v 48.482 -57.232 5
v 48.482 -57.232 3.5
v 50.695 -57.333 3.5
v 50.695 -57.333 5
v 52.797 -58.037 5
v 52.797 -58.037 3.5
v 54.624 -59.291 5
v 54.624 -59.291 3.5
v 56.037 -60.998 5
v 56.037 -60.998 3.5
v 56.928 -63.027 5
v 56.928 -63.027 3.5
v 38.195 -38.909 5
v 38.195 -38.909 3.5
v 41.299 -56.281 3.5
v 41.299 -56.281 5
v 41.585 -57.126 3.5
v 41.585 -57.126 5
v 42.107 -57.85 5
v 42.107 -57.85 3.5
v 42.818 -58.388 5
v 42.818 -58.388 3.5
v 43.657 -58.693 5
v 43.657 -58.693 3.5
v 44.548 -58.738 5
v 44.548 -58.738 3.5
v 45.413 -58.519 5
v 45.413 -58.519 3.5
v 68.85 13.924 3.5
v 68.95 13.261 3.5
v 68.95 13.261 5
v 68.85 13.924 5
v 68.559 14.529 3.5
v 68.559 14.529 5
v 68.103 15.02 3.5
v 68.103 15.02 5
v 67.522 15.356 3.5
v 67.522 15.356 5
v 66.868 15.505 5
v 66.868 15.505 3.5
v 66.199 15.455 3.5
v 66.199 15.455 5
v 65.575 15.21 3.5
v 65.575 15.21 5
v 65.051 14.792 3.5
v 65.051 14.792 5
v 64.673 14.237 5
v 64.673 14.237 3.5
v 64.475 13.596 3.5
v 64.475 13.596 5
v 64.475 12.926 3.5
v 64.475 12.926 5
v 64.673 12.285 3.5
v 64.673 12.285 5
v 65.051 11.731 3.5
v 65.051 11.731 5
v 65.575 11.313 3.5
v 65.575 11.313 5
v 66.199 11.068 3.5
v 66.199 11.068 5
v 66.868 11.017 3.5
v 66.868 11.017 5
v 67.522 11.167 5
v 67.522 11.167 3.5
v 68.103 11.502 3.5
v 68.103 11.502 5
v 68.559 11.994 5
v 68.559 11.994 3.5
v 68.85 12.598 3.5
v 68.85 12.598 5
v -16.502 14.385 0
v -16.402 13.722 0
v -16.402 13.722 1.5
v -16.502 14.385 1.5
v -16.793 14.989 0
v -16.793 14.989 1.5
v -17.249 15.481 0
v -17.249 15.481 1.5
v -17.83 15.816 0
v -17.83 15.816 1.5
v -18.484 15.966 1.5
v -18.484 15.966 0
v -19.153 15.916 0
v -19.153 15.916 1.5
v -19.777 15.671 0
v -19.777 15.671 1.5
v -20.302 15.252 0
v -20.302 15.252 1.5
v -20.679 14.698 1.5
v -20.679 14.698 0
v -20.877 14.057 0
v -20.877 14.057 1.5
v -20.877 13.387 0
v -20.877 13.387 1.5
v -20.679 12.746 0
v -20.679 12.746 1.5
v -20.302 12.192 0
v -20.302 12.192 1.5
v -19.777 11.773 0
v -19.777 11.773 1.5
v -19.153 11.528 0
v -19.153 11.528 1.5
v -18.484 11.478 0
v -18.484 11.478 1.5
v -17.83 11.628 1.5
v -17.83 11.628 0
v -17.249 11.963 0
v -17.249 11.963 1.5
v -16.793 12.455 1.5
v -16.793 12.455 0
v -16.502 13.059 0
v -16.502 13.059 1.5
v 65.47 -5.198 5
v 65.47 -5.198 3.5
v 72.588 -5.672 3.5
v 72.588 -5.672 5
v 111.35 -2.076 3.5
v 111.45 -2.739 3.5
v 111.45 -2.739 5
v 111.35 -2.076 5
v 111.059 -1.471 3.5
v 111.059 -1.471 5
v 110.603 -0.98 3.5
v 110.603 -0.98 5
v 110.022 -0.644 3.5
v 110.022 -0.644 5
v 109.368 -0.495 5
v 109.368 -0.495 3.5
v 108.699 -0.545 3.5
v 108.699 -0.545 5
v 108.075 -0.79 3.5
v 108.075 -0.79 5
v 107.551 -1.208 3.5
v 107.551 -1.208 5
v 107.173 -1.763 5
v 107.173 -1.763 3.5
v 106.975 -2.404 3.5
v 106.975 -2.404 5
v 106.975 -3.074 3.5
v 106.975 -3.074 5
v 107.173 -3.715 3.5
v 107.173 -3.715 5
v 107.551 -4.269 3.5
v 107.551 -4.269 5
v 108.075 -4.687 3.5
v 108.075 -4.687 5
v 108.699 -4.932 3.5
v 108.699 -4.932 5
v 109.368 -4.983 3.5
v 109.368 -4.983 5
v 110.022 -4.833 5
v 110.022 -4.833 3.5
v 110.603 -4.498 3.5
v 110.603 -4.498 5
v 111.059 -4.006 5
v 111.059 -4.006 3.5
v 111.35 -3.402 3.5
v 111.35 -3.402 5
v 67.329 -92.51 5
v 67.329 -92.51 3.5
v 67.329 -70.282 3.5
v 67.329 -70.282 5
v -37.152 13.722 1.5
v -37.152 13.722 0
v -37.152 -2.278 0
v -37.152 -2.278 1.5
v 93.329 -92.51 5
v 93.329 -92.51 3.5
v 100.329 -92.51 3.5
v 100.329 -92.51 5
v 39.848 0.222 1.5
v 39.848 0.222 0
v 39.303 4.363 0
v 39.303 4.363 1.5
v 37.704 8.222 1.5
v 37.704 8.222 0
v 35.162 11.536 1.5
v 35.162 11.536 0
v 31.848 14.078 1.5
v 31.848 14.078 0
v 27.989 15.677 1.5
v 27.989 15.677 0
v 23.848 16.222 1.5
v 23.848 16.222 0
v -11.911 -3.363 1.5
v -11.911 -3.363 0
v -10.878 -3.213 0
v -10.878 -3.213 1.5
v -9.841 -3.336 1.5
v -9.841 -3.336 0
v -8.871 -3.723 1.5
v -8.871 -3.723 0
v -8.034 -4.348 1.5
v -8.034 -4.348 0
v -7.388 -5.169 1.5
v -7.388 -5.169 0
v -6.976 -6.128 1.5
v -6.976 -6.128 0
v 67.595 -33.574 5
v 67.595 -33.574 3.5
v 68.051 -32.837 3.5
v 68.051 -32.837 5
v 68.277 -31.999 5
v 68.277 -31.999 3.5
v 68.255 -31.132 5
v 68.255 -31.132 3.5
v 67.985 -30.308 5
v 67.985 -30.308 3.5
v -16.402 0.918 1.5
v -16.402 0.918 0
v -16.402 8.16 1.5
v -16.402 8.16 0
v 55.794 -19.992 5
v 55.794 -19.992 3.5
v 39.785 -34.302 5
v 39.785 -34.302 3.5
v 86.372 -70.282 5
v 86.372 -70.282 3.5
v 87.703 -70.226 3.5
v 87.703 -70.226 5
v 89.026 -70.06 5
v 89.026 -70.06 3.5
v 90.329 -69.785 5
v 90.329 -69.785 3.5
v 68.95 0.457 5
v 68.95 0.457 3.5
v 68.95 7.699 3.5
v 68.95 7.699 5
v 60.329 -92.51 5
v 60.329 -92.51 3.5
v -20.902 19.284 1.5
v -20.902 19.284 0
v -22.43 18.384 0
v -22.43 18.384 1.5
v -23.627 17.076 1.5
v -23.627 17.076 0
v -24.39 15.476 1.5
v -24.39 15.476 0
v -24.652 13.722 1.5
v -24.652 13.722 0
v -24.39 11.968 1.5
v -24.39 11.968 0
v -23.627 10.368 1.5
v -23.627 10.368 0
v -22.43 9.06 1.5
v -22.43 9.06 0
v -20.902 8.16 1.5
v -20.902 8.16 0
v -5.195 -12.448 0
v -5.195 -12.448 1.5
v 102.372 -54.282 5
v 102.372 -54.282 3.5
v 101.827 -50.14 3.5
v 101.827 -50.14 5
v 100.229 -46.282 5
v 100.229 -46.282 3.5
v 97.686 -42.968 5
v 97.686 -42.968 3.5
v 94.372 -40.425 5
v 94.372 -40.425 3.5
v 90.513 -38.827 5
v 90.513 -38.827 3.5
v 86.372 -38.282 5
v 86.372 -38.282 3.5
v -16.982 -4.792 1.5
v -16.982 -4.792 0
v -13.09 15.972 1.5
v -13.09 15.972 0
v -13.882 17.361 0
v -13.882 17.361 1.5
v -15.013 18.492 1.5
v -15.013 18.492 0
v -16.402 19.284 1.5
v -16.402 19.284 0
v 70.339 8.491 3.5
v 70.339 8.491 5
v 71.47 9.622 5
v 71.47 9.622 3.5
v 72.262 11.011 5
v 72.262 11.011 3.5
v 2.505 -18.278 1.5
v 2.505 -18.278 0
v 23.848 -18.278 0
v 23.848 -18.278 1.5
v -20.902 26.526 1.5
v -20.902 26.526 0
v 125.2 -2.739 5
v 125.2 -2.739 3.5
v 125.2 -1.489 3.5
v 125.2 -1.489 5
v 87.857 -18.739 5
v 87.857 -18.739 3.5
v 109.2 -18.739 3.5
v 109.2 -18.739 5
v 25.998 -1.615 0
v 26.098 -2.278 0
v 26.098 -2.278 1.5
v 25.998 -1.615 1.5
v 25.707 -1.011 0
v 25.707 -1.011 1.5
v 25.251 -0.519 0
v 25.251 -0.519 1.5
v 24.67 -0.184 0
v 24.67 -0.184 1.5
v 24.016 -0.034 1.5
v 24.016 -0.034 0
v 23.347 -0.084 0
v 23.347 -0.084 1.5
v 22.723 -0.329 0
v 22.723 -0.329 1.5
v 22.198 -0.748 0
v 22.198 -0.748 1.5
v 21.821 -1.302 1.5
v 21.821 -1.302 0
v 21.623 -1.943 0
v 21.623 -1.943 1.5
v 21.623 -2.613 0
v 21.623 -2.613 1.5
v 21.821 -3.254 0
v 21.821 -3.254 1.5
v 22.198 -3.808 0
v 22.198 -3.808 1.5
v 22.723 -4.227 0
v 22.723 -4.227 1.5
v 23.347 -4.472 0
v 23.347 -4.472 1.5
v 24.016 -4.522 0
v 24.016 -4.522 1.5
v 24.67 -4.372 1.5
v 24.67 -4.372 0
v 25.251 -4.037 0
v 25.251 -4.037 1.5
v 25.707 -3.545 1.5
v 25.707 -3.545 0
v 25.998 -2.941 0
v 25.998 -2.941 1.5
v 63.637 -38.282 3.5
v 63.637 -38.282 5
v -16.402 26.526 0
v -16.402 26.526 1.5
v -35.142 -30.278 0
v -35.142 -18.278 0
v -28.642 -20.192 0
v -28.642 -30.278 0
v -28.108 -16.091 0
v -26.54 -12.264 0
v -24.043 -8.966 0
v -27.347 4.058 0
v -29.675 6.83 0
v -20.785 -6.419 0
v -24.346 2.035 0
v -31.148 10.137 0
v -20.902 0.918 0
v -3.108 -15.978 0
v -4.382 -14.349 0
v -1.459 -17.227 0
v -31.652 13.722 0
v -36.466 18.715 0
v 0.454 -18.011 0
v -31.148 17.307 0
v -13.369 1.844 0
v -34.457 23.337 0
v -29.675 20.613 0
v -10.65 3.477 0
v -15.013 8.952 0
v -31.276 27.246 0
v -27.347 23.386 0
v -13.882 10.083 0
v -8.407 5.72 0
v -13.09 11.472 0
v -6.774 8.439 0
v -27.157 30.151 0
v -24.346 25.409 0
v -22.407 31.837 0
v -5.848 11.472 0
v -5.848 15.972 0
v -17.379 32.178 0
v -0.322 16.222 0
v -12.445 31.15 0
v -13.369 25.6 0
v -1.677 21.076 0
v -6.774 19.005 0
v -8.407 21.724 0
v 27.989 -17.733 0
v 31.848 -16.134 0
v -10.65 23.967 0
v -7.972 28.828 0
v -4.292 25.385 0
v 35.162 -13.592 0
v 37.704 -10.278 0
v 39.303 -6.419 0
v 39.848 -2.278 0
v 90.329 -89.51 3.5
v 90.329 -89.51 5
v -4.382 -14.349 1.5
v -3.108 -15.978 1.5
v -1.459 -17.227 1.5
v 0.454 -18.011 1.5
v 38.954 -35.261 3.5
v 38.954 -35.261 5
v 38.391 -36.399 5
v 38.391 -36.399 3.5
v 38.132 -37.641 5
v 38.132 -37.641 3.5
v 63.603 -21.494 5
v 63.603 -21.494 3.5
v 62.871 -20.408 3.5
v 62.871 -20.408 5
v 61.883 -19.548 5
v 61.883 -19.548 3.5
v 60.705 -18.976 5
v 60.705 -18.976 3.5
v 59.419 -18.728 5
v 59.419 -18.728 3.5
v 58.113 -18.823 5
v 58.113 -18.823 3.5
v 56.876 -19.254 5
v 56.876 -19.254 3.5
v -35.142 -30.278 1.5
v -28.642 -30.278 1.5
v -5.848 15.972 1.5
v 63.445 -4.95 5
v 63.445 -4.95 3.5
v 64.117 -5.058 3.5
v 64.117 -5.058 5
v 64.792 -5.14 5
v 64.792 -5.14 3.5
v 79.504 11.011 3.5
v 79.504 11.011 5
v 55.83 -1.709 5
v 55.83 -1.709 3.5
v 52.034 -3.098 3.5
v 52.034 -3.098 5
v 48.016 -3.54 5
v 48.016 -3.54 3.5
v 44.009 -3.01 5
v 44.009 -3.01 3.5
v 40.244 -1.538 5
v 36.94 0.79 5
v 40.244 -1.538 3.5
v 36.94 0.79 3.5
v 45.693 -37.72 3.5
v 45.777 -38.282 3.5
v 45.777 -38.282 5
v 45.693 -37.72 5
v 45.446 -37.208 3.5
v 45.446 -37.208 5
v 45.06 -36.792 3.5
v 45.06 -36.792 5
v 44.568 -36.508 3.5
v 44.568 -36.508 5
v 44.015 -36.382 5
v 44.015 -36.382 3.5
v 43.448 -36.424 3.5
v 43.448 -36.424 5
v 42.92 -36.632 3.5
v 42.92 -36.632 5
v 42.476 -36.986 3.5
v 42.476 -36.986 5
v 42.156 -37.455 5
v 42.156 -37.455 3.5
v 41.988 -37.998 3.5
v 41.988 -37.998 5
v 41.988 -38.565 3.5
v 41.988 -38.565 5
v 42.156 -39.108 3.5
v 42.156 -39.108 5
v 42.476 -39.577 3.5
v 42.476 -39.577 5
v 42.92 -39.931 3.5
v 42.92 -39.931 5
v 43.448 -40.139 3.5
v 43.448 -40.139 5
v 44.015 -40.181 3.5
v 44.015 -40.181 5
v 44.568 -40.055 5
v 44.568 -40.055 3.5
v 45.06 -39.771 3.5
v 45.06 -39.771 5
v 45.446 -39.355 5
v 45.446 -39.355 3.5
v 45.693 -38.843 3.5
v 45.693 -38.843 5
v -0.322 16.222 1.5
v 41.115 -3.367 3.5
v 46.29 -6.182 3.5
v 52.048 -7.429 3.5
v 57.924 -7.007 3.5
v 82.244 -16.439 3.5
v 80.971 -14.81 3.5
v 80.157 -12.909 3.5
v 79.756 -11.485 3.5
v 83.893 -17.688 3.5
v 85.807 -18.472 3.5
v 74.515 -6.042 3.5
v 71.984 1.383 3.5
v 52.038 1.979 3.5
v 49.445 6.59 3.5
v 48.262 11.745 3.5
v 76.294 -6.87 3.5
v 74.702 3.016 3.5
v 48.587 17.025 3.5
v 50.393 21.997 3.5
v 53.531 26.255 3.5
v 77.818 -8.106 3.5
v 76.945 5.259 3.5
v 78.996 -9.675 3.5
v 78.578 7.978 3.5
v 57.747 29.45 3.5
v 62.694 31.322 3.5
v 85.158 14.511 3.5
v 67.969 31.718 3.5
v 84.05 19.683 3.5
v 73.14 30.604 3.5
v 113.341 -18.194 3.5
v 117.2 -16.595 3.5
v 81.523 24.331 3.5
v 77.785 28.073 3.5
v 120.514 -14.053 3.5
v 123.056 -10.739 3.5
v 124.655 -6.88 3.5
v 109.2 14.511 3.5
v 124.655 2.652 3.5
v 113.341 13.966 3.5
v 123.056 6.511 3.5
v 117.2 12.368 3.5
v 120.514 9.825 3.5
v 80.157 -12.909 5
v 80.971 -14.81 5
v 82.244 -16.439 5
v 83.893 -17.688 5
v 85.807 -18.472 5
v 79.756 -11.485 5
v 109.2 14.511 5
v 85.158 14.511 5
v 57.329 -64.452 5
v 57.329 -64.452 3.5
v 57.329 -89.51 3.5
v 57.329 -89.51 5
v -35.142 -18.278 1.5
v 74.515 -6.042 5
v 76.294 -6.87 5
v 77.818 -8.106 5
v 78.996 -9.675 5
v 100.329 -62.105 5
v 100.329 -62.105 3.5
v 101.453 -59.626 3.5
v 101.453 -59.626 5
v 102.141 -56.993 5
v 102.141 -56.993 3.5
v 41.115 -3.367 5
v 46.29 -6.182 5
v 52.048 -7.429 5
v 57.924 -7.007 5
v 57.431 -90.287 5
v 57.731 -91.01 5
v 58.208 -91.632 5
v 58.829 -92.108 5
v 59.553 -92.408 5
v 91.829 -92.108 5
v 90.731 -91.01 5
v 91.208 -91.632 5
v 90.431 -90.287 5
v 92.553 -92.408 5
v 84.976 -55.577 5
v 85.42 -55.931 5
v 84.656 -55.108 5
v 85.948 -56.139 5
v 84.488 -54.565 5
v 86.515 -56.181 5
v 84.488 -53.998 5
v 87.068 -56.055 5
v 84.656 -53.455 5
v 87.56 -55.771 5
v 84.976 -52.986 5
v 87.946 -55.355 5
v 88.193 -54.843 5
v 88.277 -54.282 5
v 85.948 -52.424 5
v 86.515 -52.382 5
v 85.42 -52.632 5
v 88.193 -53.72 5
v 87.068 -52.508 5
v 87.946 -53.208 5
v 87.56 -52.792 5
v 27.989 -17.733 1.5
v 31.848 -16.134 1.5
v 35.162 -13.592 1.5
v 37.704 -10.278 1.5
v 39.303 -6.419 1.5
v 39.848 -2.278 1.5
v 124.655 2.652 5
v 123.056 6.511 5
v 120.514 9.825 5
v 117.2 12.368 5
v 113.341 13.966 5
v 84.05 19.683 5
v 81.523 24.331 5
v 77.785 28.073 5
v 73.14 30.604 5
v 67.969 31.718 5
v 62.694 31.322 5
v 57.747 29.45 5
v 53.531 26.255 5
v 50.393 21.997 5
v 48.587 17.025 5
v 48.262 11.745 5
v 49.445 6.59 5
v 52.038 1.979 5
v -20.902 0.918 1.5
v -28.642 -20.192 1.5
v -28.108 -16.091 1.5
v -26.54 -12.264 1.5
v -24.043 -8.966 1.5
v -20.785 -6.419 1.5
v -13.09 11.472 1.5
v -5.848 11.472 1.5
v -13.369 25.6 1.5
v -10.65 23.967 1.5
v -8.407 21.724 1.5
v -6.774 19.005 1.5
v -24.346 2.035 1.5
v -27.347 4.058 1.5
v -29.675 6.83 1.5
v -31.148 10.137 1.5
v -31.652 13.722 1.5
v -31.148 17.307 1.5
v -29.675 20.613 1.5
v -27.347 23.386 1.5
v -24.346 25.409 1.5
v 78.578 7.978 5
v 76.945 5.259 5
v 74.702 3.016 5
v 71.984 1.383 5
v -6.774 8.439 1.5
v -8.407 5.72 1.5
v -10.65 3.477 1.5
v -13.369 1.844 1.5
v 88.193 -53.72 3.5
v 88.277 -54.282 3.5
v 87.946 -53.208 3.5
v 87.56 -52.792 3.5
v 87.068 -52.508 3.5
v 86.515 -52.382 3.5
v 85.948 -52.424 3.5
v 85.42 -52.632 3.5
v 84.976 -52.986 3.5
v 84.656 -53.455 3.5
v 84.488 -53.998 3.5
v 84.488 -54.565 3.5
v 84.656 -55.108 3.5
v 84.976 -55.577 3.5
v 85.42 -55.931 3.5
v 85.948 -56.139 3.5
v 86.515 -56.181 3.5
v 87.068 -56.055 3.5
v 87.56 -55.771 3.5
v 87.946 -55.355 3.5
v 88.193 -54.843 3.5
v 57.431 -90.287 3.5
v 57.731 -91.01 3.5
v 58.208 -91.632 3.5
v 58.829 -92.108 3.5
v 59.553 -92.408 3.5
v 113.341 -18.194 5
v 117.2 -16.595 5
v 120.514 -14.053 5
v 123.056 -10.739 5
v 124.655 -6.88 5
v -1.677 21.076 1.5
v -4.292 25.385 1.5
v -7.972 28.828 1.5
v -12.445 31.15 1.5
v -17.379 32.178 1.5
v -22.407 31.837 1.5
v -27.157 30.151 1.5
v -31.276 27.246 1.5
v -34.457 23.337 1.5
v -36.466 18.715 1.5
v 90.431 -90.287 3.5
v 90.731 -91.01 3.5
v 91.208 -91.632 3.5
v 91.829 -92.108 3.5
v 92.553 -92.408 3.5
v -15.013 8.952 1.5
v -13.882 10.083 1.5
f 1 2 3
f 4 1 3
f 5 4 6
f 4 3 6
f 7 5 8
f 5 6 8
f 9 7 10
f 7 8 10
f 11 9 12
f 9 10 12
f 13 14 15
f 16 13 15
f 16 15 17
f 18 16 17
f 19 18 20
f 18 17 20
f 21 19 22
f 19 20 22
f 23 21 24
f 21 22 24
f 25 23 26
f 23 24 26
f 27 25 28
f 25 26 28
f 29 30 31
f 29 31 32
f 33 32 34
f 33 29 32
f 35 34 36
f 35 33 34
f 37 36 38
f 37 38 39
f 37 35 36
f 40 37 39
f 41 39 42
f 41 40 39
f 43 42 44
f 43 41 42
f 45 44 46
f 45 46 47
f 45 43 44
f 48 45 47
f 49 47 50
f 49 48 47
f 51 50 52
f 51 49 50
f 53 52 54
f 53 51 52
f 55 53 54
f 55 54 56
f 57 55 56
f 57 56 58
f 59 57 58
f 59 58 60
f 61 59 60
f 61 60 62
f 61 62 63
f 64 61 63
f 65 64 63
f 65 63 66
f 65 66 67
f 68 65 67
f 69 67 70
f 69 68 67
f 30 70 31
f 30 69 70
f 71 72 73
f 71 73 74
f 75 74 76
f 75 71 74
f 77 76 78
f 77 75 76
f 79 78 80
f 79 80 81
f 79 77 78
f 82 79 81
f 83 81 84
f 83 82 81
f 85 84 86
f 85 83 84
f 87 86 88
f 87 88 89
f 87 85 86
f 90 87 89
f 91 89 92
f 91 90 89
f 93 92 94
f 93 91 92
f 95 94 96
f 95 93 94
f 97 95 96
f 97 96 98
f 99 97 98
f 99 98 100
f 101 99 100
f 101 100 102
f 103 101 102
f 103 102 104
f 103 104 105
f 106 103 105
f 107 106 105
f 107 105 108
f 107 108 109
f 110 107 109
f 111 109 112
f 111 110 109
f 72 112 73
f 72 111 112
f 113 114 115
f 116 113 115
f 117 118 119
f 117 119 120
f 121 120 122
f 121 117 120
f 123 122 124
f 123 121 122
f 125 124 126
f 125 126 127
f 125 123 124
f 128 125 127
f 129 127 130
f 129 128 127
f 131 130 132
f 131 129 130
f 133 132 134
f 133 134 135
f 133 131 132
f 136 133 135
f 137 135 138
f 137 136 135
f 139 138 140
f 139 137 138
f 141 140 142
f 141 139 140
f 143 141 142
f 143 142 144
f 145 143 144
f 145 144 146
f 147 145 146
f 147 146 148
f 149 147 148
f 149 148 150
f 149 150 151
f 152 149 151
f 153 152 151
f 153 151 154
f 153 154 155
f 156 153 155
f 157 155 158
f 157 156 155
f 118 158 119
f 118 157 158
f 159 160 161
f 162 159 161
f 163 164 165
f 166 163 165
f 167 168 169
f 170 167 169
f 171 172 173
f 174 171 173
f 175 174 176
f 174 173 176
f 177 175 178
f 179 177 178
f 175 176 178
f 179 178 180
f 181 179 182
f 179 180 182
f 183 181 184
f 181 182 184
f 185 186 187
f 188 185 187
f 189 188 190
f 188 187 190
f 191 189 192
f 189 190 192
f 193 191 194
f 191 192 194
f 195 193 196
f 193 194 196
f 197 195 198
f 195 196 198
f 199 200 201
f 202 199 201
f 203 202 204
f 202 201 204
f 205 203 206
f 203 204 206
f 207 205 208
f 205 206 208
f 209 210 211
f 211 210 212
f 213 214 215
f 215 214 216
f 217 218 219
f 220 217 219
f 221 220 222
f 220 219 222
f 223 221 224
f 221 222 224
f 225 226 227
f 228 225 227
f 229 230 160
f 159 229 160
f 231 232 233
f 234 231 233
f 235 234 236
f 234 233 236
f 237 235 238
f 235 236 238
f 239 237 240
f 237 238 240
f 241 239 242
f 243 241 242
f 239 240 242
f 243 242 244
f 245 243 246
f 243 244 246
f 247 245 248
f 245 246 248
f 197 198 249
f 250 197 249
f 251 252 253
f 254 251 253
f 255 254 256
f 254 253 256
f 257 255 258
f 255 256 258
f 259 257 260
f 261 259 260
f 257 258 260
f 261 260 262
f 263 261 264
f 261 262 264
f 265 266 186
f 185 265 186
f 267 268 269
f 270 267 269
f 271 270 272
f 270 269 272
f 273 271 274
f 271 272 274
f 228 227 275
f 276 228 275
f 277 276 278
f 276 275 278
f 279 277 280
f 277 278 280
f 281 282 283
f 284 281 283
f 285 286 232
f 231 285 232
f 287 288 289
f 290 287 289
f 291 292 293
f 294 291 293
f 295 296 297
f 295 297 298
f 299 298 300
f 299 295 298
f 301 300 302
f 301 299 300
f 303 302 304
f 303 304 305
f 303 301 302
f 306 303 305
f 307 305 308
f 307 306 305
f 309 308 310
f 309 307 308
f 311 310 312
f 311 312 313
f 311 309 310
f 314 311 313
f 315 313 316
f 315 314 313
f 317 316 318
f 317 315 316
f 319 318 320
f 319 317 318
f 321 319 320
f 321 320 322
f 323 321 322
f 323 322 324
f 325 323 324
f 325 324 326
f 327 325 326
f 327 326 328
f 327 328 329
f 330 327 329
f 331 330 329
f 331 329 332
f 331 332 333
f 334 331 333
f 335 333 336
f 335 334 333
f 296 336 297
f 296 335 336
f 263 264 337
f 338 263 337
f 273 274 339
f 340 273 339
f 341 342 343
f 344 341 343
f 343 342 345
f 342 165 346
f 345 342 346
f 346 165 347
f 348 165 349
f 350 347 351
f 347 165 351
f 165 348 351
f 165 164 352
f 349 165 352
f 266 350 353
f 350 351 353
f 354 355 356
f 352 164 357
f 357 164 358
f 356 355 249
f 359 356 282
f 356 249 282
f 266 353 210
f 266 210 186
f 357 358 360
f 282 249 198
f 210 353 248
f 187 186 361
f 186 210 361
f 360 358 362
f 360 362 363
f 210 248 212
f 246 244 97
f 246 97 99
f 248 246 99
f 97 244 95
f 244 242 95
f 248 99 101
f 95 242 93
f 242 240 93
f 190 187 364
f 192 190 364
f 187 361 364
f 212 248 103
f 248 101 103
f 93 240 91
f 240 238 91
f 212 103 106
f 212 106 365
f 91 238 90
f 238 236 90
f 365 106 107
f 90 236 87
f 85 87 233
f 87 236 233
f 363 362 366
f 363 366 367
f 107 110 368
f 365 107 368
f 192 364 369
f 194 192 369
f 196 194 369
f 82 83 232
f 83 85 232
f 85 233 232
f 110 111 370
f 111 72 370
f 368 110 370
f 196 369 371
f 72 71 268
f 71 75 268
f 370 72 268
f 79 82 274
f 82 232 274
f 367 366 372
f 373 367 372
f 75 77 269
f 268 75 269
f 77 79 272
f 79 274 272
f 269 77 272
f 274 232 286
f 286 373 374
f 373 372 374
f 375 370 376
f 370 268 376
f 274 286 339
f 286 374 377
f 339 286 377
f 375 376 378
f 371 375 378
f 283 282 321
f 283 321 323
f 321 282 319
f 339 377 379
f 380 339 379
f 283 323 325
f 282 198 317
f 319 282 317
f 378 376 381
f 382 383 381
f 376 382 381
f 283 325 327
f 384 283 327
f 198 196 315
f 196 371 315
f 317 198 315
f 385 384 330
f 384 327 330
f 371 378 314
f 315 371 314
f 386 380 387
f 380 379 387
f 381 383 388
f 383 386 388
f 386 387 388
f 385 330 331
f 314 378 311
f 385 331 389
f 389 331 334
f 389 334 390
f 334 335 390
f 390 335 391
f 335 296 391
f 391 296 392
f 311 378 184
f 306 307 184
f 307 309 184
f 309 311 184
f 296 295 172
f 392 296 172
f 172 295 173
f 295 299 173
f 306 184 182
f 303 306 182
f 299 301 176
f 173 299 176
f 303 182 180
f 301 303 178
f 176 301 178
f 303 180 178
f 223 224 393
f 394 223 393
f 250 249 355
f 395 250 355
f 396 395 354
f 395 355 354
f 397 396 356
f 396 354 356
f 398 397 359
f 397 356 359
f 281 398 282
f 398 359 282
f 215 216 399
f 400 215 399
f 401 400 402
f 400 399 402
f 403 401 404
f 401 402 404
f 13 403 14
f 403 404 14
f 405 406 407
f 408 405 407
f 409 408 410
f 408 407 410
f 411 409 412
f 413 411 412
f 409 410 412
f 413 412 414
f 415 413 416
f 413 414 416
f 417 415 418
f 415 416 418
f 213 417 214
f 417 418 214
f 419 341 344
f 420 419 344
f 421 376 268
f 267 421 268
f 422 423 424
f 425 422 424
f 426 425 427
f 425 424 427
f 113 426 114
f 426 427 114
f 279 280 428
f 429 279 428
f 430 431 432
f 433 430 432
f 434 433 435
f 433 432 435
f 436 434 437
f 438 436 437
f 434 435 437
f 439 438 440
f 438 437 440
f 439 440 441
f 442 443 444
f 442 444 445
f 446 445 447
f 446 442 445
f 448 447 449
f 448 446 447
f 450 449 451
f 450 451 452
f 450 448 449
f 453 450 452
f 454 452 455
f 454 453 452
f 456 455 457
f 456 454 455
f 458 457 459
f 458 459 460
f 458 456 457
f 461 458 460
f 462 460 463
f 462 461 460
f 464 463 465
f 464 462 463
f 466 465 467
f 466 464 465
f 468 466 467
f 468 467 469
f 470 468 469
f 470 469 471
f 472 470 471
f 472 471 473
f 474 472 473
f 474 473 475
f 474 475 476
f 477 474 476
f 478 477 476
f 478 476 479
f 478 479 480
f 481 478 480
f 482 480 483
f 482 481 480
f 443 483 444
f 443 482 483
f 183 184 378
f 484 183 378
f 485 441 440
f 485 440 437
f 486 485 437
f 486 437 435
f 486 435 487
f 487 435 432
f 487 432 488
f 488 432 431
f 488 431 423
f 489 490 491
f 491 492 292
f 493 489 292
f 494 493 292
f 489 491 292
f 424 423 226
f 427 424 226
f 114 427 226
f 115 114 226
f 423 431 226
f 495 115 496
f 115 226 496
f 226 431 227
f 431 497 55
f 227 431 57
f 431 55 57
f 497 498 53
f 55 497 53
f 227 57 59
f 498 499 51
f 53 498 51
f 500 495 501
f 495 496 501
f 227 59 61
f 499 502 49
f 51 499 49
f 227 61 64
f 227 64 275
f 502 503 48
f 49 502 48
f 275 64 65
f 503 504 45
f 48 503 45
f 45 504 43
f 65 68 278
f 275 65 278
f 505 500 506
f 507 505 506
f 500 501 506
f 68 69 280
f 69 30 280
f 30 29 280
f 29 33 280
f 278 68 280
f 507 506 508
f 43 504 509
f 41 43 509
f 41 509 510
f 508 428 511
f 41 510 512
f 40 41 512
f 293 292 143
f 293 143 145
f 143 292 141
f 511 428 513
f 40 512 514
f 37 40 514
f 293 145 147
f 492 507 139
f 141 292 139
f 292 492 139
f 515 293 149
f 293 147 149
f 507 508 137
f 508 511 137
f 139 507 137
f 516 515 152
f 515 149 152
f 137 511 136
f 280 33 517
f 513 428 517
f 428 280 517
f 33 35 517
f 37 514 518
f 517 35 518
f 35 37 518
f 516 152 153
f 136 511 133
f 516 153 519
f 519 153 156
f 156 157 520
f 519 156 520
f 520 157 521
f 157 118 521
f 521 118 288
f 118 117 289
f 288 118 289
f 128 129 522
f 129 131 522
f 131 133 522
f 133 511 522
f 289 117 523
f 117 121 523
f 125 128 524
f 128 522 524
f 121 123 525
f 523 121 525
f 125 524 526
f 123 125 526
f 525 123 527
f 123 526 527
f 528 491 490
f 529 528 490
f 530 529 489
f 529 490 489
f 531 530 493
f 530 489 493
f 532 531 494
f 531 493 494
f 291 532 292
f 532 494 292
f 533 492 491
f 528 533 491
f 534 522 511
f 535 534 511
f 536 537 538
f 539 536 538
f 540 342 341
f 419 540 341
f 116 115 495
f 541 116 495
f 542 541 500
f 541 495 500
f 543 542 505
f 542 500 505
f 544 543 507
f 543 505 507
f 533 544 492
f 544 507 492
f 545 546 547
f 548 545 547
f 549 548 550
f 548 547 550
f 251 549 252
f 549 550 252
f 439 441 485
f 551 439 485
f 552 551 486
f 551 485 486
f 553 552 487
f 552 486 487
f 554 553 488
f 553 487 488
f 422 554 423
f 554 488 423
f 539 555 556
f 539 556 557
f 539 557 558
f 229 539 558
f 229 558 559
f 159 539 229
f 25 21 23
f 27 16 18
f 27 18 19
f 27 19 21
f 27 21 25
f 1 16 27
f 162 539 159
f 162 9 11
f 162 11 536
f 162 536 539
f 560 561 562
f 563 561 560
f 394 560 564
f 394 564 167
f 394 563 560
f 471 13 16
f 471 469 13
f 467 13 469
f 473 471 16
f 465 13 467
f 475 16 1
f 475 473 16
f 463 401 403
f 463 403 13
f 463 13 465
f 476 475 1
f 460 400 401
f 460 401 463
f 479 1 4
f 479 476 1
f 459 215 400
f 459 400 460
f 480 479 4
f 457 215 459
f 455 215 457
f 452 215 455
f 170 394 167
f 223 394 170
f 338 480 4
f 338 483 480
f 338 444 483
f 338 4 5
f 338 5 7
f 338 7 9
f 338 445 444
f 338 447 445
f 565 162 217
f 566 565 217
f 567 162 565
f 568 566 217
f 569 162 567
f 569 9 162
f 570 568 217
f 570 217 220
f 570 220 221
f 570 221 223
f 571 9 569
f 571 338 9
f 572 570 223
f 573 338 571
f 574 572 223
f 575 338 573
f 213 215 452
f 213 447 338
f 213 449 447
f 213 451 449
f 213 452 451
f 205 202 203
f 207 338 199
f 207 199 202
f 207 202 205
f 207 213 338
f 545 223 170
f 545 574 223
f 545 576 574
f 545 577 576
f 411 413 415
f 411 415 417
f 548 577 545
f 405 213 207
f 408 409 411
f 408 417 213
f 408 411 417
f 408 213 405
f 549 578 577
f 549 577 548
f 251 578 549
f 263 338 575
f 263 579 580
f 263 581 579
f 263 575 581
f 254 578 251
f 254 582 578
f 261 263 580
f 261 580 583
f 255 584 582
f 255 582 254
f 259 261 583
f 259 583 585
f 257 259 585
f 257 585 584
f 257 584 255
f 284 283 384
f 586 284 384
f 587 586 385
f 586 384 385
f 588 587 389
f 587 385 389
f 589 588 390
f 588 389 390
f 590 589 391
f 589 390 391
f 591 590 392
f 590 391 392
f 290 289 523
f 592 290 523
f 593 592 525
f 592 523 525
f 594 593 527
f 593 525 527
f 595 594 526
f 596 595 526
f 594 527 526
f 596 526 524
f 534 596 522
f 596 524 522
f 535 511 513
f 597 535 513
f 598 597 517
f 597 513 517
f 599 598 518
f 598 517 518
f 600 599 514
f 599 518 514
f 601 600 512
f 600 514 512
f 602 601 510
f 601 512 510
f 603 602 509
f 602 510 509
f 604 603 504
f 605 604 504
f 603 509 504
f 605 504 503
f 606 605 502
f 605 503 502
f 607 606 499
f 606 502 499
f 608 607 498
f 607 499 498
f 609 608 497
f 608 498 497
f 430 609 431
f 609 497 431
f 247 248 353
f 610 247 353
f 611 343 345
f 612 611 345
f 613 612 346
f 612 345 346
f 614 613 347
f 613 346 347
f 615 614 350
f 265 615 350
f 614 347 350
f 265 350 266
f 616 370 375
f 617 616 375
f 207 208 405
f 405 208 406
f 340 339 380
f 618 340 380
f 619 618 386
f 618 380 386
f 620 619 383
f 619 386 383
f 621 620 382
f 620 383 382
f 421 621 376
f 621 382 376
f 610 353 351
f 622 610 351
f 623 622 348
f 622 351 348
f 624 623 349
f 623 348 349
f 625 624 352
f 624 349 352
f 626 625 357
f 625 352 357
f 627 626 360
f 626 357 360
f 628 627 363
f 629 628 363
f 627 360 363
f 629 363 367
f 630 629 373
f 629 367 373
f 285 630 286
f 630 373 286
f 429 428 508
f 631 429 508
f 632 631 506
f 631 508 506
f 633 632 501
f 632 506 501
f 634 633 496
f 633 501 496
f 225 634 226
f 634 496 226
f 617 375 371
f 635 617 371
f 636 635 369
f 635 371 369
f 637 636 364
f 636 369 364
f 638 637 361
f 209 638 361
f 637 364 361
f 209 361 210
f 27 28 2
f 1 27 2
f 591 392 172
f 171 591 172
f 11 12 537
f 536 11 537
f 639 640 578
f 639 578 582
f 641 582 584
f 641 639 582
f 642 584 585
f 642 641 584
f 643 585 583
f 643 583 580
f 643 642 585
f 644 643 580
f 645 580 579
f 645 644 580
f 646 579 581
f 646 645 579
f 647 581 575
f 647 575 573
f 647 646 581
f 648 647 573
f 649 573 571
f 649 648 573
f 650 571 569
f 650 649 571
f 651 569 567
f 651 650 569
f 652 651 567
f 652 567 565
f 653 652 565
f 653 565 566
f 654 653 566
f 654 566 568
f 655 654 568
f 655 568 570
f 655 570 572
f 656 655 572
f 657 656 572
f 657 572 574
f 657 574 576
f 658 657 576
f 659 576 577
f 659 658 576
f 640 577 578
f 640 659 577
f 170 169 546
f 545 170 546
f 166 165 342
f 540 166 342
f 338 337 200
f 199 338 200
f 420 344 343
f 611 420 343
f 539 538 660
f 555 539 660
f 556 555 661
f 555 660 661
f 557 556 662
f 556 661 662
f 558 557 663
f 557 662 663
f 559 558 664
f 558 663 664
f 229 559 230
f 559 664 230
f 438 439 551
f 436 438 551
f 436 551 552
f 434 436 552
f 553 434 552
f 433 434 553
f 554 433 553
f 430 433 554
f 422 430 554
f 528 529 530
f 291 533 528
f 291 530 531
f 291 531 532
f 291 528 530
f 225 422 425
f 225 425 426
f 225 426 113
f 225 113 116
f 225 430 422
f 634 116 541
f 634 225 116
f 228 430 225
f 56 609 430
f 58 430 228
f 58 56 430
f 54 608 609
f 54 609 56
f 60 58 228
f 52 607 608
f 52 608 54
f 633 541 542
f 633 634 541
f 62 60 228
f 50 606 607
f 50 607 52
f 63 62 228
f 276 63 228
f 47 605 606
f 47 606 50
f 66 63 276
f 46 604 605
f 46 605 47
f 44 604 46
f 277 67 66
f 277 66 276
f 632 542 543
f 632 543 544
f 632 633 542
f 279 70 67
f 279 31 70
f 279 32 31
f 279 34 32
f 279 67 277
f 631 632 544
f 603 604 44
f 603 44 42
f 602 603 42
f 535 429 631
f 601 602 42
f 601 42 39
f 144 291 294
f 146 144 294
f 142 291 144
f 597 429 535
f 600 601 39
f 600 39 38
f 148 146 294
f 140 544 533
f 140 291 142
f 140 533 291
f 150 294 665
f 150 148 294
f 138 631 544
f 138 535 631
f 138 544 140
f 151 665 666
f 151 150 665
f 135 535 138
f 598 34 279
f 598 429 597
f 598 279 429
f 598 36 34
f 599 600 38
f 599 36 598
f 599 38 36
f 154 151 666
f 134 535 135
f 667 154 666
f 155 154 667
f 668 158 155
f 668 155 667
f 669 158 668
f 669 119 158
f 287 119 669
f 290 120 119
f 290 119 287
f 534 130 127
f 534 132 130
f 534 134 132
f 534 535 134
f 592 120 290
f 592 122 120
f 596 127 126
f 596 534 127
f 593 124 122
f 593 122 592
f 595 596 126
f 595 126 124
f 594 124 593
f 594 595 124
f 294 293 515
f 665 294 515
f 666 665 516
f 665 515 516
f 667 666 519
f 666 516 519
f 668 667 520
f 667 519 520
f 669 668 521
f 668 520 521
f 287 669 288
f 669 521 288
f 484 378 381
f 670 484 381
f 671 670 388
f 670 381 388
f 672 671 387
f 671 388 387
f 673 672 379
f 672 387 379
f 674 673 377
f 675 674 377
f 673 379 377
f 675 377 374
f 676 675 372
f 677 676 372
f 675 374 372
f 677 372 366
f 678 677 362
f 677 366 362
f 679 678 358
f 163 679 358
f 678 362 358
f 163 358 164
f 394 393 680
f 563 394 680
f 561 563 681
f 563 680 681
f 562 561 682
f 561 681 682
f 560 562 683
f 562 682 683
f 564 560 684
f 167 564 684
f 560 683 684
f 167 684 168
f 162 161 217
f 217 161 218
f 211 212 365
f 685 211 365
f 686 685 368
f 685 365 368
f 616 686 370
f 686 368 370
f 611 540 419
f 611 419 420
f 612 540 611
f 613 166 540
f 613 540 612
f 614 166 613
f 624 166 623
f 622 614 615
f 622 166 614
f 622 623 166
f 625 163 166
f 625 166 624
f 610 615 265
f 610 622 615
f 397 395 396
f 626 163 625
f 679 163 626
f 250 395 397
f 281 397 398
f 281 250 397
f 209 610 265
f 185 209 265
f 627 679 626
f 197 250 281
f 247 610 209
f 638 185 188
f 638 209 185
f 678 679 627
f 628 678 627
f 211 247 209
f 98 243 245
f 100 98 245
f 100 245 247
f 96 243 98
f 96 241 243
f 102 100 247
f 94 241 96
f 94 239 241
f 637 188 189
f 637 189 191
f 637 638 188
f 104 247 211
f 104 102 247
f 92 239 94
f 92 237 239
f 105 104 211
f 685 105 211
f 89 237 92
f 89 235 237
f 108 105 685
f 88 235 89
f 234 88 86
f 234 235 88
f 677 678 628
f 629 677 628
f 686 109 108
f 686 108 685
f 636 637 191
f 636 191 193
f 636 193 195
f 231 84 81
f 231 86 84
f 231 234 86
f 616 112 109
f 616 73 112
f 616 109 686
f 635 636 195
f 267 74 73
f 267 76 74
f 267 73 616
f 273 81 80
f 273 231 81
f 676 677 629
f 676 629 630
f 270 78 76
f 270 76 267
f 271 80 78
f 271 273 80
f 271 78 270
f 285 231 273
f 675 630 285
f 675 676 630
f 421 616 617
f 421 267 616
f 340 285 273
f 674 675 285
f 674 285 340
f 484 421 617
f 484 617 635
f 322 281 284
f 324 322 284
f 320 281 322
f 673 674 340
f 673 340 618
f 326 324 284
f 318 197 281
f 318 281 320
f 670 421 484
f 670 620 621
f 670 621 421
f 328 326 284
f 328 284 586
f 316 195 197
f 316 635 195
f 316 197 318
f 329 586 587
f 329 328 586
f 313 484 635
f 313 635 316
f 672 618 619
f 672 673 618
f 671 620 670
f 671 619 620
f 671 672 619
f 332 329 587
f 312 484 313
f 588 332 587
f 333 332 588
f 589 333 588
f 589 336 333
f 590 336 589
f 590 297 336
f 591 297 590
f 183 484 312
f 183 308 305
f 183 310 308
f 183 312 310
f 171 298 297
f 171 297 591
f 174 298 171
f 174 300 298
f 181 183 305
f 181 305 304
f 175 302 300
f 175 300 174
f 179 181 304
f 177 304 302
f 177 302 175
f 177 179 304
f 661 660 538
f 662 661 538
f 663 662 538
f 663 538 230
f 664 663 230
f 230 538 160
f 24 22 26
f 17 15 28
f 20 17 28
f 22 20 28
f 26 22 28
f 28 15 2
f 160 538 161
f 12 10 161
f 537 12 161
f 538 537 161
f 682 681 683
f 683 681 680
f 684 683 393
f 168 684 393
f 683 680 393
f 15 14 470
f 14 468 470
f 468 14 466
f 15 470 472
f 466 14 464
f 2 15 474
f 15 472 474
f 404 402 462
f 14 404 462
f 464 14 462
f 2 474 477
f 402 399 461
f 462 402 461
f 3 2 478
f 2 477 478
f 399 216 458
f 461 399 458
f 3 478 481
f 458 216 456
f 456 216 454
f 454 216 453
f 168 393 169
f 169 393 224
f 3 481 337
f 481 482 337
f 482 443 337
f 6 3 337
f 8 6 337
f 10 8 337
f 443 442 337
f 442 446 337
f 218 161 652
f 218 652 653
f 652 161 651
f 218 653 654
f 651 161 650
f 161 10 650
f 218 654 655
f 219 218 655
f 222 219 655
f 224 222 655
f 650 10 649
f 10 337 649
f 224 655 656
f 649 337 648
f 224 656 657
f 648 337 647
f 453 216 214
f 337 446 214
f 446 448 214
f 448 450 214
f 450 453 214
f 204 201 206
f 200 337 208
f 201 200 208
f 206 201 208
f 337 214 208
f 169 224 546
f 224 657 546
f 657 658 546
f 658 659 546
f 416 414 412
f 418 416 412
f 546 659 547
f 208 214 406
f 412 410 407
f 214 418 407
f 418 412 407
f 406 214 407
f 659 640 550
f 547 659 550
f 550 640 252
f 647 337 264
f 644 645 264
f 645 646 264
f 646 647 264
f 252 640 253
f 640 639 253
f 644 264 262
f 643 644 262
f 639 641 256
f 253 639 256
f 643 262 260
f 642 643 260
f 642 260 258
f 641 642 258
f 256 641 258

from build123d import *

# Parameters (mm, degrees)
F1_R     = 2.25
F2_DEPTH = 1.5
F3_R     = 2.25
F4_DEPTH = 1.5
F5_R     = 1.905
F6_DEPTH = 1.5


# Not quite as in the source:
# - a feature names something its author has since deleted; it is built from what else it names


with BuildPart() as f2:
    # F1 (on Top) → F2 (new body)
    with BuildSketch(Plane.XY):
        with BuildLine():
            Line((23.8478663564, 16.2219721824), (-0.3218308638, 16.2219721824))
            ThreePointArc((-0.3218308638, 16.2219721824), (-19.9050100488, 32.1794991216), (-37.1521336436, 13.7219721824))
            Line((-37.1521336436, 13.7219721824), (-37.1521336436, -2.2780278176))
            Line((-37.1521336436, -2.2780278176), (-35.1421336436, -18.2780278176))
            Line((-35.1421336436, -18.2780278176), (-35.1421336436, -30.2780278176))
            Line((-35.1421336436, -30.2780278176), (-28.6421336436, -30.2780278176))
            Line((-28.6421336436, -30.2780278176), (-28.6421336436, -20.1922246362))
            ThreePointArc((-28.6421336436, -20.1922246362), (-25.3982996099, -10.5340555633), (-16.9821049136, -4.7920736832))
            Line((-16.9821049136, -4.7920736832), (-11.9111882435, -3.3630206351))
            ThreePointArc((-11.9111882435, -3.3630206351), (-8.8710134123, -3.723464802), (-6.9761576878, -6.1280655559))
            Line((-6.9761576878, -6.1280655559), (-5.1951107108, -12.4480134526))
            ThreePointArc((-5.1951107108, -12.4480134526), (-2.3241197708, -16.6561108008), (2.5049647657, -18.2780278176))
            Line((2.5049647657, -18.2780278176), (23.8478663564, -18.2780278176))
            ThreePointArc((23.8478663564, -18.2780278176), (35.1615748554, -13.5917363166), (39.8478663564, -2.2780278176))
            Line((39.8478663564, -2.2780278176), (39.8478663564, 0.2219721824))
            ThreePointArc((39.8478663564, 0.2219721824), (35.1615748554, 11.5356806814), (23.8478663564, 16.2219721824))
        make_face()
        with Locations((23.8478663564, -2.2780278176)):
            Circle(F1_R, mode=Mode.SUBTRACT)
        with BuildLine():
            Line((-20.9021336436, 26.5257802097), (-20.9021336436, 19.2841210477))
            ThreePointArc((-20.9021336436, 19.2841210477), (-24.6521336436, 13.7219721824), (-20.9021336436, 8.1598233171))
            Line((-20.9021336436, 8.1598233171), (-20.9021336436, 0.9181641551))
            ThreePointArc((-20.9021336436, 0.9181641551), (-31.6521336436, 13.7219721824), (-20.9021336436, 26.5257802097))
        make_face(mode=Mode.SUBTRACT)
        with Locations((-18.6521336436, 13.7219721824)):
            Circle(F1_R, mode=Mode.SUBTRACT)
        with BuildLine():
            ThreePointArc((-16.4021336436, 8.1598233171), (-14.4094929565, 9.4793314953), (-13.0899847783, 11.4719721824))
            Line((-13.0899847783, 11.4719721824), (-5.8483256163, 11.4719721824))
            ThreePointArc((-5.8483256163, 11.4719721824), (-9.4597454882, 4.529584027), (-16.4021336436, 0.9181641551))
            Line((-16.4021336436, 0.9181641551), (-16.4021336436, 8.1598233171))
        make_face(mode=Mode.SUBTRACT)
        with BuildLine():
            ThreePointArc((-13.0899847783, 15.9719721824), (-14.4094929565, 17.9646128695), (-16.4021336436, 19.2841210477))
            Line((-16.4021336436, 19.2841210477), (-16.4021336436, 26.5257802097))
            ThreePointArc((-16.4021336436, 26.5257802097), (-9.4597454882, 22.9143603378), (-5.8483256163, 15.9719721824))
            Line((-5.8483256163, 15.9719721824), (-13.0899847783, 15.9719721824))
        make_face(mode=Mode.SUBTRACT)
    extrude(amount=F2_DEPTH)


with BuildPart() as f4:
    # F3 (on offset) → F4 (new body)
    with BuildSketch(Plane.XY.offset(3.5)):
        with BuildLine():
            Line((109.2000847661, 14.5111365989), (85.1578067274, 14.5111365989))
            ThreePointArc((85.1578067274, 14.5111365989), (85.1895122354, 13.8864939832), (85.2000847661, 13.2611365989))
            ThreePointArc((85.2000847661, 13.2611365989), (79.3391563377, -0.2482627146), (65.4699366786, -5.1979190563))
            Line((65.4699366786, -5.1979190563), (72.5876051284, -5.6722546017))
            ThreePointArc((72.5876051284, -5.6722546017), (77.0942321722, -7.4406386068), (79.7557246751, -11.4845633041))
            Line((79.7557246751, -11.4845633041), (80.1571076989, -12.9088490361))
            ThreePointArc((80.1571076989, -12.9088490361), (83.028098639, -17.1169463843), (87.8571831754, -18.7388634011))
            Line((87.8571831754, -18.7388634011), (109.2000847661, -18.7388634011))
            ThreePointArc((109.2000847661, -18.7388634011), (120.5137932651, -14.0525719001), (125.2000847661, -2.7388634011))
            Line((125.2000847661, -2.7388634011), (125.2000847661, -1.4888634011))
            ThreePointArc((125.2000847661, -1.4888634011), (120.5137932651, 9.8248450979), (109.2000847661, 14.5111365989))
        make_face()
        with Locations((109.2000847661, -2.7388634011)):
            Circle(F3_R, mode=Mode.SUBTRACT)
        with BuildLine():
            ThreePointArc((85.2000847661, 13.2611365989), (85.1895122354, 13.8864939832), (85.1578067274, 14.5111365989))
            ThreePointArc((85.1578067274, 14.5111365989), (57.7465852827, 29.4501713755), (55.8302690835, -1.7087367147))
            ThreePointArc((55.8302690835, -1.7087367147), (59.4538765607, -3.7606866479), (63.4446329394, -4.9501794822))
            ThreePointArc((63.4446329394, -4.9501794822), (64.4538667509, -5.1019923455), (65.4699366786, -5.1979190563))
            ThreePointArc((65.4699366786, -5.1979190563), (79.3391563377, -0.2482627146), (85.2000847661, 13.2611365989))
        make_face()
        with BuildLine():
            Line((68.9500847661, 0.4573285716), (68.9500847661, 7.6989877336))
            ThreePointArc((68.9500847661, 7.6989877336), (70.9427254533, 9.0184959118), (72.2622336315, 11.0111365989))
            Line((72.2622336315, 11.0111365989), (79.5038927935, 11.0111365989))
            ThreePointArc((79.5038927935, 11.0111365989), (75.8924729216, 4.0687484435), (68.9500847661, 0.4573285716))
        make_face(mode=Mode.SUBTRACT)
        with Locations((66.7000847661, 13.2611365989)):
            Circle(F3_R, mode=Mode.SUBTRACT)
        with BuildLine():
            ThreePointArc((63.4446329394, -4.9501794822), (59.4538765607, -3.7606866479), (55.8302690835, -1.7087367147))
            ThreePointArc((55.8302690835, -1.7087367147), (45.9967207055, -3.3960542374), (36.9400847661, 0.7900011357))
            ThreePointArc((36.9400847661, 0.7900011357), (49.1243667434, -7.0114058331), (63.4446329394, -4.9501794822))
        make_face()
    extrude(amount=F4_DEPTH)


with BuildPart() as f6:
    # F5 (on offset) → F6 (new body)
    with BuildSketch(Plane.XY.offset(3.5)):
        with BuildLine():
            Line((86.3721772379, -38.2815617886), (63.6372811817, -38.2815617886))
            Line((63.6372811817, -38.2815617886), (67.5948618811, -33.5741011418))
            ThreePointArc((67.5948618811, -33.5741011418), (68.2773760162, -31.9993262849), (67.9849045951, -30.3081131515))
            Line((67.9849045951, -30.3081131515), (63.6031002529, -21.4938680874))
            ThreePointArc((63.6031002529, -21.4938680874), (60.07017827, -18.8096304864), (55.7936149014, -19.9918635388))
            Line((55.7936149014, -19.9918635388), (39.7849043568, -34.3018614395))
            ThreePointArc((39.7849043568, -34.3018614395), (38.3906107486, -36.3986590518), (38.195076482, -38.9091134417))
            Line((38.195076482, -38.9091134417), (41.2990189026, -56.2805721912))
            ThreePointArc((41.2990189026, -56.2805721912), (42.8181559772, -58.3879184832), (45.412651037, -58.5193765789))
            Line((45.412651037, -58.5193765789), (48.4815553554, -57.232122972))
            ThreePointArc((48.4815553554, -57.232122972), (53.7537831872, -58.6006612256), (56.9278171468, -63.0272616916))
            Line((56.9278171468, -63.0272616916), (57.3292001707, -64.4515474235))
            ThreePointArc((57.3292001707, -64.4515474235), (60.2001911107, -68.6596447717), (65.0292756472, -70.2815617886))
            Line((65.0292756472, -70.2815617886), (67.3292001707, -70.2815617886))
            Line((67.3292001707, -70.2815617886), (86.3721772379, -70.2815617886))
            ThreePointArc((86.3721772379, -70.2815617886), (88.3662354627, -70.1568171187), (90.3292001707, -69.7845282631))
            ThreePointArc((90.3292001707, -69.7845282631), (96.117596449, -66.9711955264), (100.3292001707, -62.1047012385))
            ThreePointArc((100.3292001707, -62.1047012385), (101.8530100147, -58.324310425), (102.3721772379, -54.2815617886))
            ThreePointArc((102.3721772379, -54.2815617886), (97.6858857369, -42.9678532896), (86.3721772379, -38.2815617886))
        make_face()
        with Locations((43.8721772379, -38.2815617886)):
            Circle(F5_R, mode=Mode.SUBTRACT)
        with Locations((86.3721772379, -54.2815617886)):
            Circle(F5_R, mode=Mode.SUBTRACT)
        with BuildLine():
            Line((100.3292001707, -92.5101898611), (100.3292001707, -62.1047012385))
            ThreePointArc((100.3292001707, -62.1047012385), (96.117596449, -66.9711955264), (90.3292001707, -69.7845282631))
            Line((90.3292001707, -69.7845282631), (90.3292001707, -89.5101898611))
            ThreePointArc((90.3292001707, -89.5101898611), (91.2078798271, -91.6315102046), (93.3292001707, -92.5101898611))
            Line((93.3292001707, -92.5101898611), (100.3292001707, -92.5101898611))
        make_face()
        with BuildLine():
            Line((67.3292001707, -92.5101898611), (67.3292001707, -70.2815617886))
            Line((67.3292001707, -70.2815617886), (65.0292756472, -70.2815617886))
            ThreePointArc((65.0292756472, -70.2815617886), (60.2001911107, -68.6596447717), (57.3292001707, -64.4515474235))
            Line((57.3292001707, -64.4515474235), (57.3292001707, -89.5101898611))
            ThreePointArc((57.3292001707, -89.5101898611), (58.2078798271, -91.6315102046), (60.3292001707, -92.5101898611))
            Line((60.3292001707, -92.5101898611), (67.3292001707, -92.5101898611))
        make_face()
    extrude(amount=F6_DEPTH)


solid = Compound([f2.part, f4.part, f6.part])
